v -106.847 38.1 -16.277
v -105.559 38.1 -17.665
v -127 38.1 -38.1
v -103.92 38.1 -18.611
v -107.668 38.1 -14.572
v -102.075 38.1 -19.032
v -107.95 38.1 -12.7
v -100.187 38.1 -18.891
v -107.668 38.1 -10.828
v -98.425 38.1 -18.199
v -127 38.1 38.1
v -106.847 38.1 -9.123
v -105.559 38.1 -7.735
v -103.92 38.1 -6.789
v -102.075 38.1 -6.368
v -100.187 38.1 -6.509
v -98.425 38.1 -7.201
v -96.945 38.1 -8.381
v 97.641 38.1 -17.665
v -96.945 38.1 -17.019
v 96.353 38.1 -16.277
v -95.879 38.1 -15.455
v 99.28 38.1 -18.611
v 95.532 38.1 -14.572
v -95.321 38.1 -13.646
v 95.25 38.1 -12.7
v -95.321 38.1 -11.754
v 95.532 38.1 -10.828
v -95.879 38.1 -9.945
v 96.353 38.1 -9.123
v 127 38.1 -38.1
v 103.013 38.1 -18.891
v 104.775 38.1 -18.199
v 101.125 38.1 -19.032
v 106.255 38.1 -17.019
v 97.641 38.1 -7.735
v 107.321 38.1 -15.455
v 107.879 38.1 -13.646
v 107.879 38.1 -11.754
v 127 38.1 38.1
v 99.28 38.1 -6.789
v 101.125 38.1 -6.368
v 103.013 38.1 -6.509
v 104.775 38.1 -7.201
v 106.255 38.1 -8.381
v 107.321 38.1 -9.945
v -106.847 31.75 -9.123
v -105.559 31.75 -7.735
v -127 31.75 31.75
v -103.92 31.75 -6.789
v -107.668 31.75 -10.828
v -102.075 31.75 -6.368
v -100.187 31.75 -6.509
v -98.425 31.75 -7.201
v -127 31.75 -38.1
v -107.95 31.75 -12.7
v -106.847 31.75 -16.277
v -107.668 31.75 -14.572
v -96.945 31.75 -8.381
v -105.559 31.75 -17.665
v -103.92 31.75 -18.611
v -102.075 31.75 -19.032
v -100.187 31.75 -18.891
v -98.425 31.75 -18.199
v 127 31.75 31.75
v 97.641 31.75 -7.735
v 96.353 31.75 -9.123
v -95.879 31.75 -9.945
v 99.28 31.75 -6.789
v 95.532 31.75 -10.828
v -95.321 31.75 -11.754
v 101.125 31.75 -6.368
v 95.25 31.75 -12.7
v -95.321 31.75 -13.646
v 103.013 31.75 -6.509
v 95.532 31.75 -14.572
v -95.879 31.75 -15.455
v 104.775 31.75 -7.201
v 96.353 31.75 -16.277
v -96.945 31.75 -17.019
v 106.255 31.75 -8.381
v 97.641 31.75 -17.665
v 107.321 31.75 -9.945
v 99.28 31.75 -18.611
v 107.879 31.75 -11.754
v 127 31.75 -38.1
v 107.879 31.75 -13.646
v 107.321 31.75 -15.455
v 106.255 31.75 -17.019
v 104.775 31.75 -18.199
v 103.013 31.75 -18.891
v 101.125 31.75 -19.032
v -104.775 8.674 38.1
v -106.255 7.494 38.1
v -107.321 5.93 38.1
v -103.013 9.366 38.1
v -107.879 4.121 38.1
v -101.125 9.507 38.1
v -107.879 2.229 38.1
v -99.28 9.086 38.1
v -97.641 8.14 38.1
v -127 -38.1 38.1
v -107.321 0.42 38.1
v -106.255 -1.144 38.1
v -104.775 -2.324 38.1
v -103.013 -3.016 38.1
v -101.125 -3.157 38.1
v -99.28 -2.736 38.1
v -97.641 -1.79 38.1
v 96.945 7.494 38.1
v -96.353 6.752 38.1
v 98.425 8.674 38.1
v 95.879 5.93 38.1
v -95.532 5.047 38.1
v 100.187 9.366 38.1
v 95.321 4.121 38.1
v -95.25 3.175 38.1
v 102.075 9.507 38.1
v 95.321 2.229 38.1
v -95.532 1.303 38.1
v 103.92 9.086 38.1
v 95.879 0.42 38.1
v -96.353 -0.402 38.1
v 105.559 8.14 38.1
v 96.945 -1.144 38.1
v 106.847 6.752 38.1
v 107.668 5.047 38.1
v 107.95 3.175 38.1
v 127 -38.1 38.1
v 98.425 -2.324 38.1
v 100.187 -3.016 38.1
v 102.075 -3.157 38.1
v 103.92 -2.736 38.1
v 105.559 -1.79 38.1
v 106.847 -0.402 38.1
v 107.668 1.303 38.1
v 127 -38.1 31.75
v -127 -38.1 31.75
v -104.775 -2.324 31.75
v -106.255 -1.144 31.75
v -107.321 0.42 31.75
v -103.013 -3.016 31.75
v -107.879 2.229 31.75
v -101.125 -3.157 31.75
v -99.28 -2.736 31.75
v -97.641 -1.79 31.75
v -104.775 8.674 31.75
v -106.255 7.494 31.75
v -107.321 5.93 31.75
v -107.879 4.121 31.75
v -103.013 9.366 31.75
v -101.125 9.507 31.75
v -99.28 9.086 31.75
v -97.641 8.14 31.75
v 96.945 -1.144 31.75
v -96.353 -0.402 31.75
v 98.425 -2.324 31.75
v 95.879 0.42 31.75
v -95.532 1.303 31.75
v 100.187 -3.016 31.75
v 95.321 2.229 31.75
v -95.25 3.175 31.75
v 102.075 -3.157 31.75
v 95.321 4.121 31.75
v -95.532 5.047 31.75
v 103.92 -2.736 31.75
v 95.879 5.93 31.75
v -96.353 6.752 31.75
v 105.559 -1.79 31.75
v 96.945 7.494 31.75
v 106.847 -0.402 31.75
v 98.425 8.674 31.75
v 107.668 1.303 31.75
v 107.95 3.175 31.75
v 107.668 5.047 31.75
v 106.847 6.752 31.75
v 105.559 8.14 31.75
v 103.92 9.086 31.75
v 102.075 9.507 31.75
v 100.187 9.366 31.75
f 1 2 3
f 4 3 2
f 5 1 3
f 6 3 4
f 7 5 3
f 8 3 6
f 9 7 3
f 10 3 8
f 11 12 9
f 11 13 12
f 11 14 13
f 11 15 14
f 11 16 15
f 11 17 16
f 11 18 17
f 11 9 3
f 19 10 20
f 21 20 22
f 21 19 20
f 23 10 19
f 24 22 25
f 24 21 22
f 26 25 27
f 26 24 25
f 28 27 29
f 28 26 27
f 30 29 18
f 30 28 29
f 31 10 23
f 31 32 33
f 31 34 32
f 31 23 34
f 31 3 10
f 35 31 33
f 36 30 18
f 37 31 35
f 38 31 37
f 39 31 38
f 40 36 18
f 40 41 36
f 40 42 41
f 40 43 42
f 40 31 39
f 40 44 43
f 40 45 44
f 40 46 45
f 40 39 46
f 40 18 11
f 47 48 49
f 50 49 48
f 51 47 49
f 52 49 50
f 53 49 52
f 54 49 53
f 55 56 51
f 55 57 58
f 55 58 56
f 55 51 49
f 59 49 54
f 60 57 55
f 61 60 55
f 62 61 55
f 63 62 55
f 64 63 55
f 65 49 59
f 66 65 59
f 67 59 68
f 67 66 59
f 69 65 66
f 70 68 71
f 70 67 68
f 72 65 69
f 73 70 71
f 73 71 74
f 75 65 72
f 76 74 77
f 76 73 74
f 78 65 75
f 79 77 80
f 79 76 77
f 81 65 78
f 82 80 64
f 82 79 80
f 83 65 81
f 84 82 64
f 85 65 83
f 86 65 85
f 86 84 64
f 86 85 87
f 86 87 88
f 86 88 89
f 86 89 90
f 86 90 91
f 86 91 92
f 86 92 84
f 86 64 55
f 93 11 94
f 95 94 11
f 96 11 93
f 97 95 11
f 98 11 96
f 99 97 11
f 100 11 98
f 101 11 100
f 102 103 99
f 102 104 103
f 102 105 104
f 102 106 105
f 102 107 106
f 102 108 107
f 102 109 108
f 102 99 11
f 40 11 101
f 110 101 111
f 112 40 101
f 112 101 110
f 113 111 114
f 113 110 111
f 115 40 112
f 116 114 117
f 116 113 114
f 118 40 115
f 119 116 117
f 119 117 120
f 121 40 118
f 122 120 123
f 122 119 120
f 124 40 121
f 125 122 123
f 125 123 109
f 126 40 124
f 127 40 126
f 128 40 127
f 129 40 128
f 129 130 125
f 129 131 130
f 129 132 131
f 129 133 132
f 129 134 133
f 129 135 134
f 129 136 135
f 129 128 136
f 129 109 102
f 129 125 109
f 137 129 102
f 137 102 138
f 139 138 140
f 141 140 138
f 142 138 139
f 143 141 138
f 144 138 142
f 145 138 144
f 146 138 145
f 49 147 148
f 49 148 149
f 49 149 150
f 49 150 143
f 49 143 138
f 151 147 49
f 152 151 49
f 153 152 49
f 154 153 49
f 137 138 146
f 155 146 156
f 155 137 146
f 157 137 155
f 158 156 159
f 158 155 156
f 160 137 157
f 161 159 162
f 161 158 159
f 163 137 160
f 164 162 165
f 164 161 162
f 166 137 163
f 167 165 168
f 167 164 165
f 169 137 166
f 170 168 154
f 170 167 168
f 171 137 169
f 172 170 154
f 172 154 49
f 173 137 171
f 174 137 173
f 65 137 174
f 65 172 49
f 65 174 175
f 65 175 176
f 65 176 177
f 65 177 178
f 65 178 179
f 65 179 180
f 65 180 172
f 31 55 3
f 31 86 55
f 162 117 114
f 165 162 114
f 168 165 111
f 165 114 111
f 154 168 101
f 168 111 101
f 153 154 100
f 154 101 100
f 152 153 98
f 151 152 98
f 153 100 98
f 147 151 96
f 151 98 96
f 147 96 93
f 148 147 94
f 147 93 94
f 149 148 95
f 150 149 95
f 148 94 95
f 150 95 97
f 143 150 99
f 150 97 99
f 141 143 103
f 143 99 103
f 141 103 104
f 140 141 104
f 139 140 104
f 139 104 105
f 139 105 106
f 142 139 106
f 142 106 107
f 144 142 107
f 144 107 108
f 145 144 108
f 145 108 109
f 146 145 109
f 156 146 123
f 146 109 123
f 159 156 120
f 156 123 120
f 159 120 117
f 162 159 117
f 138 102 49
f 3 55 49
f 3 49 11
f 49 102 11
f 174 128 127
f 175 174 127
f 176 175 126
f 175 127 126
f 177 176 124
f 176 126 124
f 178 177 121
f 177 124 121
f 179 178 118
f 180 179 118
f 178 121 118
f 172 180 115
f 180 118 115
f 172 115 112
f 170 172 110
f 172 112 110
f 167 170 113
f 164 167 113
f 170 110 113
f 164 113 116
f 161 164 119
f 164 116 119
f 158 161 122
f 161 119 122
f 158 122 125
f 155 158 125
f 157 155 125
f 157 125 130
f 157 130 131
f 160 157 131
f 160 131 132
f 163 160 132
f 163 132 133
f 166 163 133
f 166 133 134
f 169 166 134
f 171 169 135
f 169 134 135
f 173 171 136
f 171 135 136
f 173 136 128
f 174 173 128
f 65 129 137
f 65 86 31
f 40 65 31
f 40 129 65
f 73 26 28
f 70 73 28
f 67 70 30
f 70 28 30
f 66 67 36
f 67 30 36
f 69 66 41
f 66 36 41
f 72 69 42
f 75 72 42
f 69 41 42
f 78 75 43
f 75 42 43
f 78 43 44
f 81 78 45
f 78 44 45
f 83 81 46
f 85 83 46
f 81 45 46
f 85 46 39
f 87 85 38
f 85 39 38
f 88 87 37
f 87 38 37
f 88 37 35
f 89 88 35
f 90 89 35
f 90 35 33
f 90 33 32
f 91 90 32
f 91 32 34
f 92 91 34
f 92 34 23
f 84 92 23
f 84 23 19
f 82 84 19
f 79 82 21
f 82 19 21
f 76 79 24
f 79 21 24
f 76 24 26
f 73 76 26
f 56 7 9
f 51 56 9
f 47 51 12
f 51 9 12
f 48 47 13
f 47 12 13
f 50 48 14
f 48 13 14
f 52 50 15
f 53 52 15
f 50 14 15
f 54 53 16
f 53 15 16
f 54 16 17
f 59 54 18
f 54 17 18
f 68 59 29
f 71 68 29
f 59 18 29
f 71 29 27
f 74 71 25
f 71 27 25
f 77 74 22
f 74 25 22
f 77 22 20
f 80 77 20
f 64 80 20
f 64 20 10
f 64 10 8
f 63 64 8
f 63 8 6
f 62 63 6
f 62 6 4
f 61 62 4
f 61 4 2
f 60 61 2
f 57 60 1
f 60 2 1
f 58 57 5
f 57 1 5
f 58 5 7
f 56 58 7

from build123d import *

# Parameters (mm, degrees)
F1_DEPTH = 127
F2_R     = 6.35
F3_DEPTH = 6.35
F4_R     = 6.35
F5_DEPTH = 6.35


with BuildPart() as f1:
    # F0 (on Right) → F1 (new body, symmetric)
    with BuildSketch(Plane.YZ):
        Polygon((38.1, 38.1), (-38.1, 38.1), (-38.1, 31.75), (31.75, 31.75), (31.75, -38.1), (38.1, -38.1), align=None)
    extrude(amount=F1_DEPTH, both=True)

    # F2 (on face) → F3 (cut, through all)
    with BuildSketch(Plane(origin=(0, 38.1, 0), x_dir=(-1, 0, 0), z_dir=(0, 1, 0))):
        with Locations((-101.6, -12.7)):
            Circle(F2_R)
        with Locations((101.6, -12.7)):
            Circle(F2_R)
    extrude(amount=-F3_DEPTH, mode=Mode.SUBTRACT)

    # F4 (on face) → F5 (cut, through all)
    with BuildSketch(Plane.XY.offset(38.1)):
        with Locations((-101.6, 3.175)):
            Circle(F4_R)
        with Locations((101.6, 3.175)):
            Circle(F4_R)
    extrude(amount=-F5_DEPTH, mode=Mode.SUBTRACT)


solid = f1.part
